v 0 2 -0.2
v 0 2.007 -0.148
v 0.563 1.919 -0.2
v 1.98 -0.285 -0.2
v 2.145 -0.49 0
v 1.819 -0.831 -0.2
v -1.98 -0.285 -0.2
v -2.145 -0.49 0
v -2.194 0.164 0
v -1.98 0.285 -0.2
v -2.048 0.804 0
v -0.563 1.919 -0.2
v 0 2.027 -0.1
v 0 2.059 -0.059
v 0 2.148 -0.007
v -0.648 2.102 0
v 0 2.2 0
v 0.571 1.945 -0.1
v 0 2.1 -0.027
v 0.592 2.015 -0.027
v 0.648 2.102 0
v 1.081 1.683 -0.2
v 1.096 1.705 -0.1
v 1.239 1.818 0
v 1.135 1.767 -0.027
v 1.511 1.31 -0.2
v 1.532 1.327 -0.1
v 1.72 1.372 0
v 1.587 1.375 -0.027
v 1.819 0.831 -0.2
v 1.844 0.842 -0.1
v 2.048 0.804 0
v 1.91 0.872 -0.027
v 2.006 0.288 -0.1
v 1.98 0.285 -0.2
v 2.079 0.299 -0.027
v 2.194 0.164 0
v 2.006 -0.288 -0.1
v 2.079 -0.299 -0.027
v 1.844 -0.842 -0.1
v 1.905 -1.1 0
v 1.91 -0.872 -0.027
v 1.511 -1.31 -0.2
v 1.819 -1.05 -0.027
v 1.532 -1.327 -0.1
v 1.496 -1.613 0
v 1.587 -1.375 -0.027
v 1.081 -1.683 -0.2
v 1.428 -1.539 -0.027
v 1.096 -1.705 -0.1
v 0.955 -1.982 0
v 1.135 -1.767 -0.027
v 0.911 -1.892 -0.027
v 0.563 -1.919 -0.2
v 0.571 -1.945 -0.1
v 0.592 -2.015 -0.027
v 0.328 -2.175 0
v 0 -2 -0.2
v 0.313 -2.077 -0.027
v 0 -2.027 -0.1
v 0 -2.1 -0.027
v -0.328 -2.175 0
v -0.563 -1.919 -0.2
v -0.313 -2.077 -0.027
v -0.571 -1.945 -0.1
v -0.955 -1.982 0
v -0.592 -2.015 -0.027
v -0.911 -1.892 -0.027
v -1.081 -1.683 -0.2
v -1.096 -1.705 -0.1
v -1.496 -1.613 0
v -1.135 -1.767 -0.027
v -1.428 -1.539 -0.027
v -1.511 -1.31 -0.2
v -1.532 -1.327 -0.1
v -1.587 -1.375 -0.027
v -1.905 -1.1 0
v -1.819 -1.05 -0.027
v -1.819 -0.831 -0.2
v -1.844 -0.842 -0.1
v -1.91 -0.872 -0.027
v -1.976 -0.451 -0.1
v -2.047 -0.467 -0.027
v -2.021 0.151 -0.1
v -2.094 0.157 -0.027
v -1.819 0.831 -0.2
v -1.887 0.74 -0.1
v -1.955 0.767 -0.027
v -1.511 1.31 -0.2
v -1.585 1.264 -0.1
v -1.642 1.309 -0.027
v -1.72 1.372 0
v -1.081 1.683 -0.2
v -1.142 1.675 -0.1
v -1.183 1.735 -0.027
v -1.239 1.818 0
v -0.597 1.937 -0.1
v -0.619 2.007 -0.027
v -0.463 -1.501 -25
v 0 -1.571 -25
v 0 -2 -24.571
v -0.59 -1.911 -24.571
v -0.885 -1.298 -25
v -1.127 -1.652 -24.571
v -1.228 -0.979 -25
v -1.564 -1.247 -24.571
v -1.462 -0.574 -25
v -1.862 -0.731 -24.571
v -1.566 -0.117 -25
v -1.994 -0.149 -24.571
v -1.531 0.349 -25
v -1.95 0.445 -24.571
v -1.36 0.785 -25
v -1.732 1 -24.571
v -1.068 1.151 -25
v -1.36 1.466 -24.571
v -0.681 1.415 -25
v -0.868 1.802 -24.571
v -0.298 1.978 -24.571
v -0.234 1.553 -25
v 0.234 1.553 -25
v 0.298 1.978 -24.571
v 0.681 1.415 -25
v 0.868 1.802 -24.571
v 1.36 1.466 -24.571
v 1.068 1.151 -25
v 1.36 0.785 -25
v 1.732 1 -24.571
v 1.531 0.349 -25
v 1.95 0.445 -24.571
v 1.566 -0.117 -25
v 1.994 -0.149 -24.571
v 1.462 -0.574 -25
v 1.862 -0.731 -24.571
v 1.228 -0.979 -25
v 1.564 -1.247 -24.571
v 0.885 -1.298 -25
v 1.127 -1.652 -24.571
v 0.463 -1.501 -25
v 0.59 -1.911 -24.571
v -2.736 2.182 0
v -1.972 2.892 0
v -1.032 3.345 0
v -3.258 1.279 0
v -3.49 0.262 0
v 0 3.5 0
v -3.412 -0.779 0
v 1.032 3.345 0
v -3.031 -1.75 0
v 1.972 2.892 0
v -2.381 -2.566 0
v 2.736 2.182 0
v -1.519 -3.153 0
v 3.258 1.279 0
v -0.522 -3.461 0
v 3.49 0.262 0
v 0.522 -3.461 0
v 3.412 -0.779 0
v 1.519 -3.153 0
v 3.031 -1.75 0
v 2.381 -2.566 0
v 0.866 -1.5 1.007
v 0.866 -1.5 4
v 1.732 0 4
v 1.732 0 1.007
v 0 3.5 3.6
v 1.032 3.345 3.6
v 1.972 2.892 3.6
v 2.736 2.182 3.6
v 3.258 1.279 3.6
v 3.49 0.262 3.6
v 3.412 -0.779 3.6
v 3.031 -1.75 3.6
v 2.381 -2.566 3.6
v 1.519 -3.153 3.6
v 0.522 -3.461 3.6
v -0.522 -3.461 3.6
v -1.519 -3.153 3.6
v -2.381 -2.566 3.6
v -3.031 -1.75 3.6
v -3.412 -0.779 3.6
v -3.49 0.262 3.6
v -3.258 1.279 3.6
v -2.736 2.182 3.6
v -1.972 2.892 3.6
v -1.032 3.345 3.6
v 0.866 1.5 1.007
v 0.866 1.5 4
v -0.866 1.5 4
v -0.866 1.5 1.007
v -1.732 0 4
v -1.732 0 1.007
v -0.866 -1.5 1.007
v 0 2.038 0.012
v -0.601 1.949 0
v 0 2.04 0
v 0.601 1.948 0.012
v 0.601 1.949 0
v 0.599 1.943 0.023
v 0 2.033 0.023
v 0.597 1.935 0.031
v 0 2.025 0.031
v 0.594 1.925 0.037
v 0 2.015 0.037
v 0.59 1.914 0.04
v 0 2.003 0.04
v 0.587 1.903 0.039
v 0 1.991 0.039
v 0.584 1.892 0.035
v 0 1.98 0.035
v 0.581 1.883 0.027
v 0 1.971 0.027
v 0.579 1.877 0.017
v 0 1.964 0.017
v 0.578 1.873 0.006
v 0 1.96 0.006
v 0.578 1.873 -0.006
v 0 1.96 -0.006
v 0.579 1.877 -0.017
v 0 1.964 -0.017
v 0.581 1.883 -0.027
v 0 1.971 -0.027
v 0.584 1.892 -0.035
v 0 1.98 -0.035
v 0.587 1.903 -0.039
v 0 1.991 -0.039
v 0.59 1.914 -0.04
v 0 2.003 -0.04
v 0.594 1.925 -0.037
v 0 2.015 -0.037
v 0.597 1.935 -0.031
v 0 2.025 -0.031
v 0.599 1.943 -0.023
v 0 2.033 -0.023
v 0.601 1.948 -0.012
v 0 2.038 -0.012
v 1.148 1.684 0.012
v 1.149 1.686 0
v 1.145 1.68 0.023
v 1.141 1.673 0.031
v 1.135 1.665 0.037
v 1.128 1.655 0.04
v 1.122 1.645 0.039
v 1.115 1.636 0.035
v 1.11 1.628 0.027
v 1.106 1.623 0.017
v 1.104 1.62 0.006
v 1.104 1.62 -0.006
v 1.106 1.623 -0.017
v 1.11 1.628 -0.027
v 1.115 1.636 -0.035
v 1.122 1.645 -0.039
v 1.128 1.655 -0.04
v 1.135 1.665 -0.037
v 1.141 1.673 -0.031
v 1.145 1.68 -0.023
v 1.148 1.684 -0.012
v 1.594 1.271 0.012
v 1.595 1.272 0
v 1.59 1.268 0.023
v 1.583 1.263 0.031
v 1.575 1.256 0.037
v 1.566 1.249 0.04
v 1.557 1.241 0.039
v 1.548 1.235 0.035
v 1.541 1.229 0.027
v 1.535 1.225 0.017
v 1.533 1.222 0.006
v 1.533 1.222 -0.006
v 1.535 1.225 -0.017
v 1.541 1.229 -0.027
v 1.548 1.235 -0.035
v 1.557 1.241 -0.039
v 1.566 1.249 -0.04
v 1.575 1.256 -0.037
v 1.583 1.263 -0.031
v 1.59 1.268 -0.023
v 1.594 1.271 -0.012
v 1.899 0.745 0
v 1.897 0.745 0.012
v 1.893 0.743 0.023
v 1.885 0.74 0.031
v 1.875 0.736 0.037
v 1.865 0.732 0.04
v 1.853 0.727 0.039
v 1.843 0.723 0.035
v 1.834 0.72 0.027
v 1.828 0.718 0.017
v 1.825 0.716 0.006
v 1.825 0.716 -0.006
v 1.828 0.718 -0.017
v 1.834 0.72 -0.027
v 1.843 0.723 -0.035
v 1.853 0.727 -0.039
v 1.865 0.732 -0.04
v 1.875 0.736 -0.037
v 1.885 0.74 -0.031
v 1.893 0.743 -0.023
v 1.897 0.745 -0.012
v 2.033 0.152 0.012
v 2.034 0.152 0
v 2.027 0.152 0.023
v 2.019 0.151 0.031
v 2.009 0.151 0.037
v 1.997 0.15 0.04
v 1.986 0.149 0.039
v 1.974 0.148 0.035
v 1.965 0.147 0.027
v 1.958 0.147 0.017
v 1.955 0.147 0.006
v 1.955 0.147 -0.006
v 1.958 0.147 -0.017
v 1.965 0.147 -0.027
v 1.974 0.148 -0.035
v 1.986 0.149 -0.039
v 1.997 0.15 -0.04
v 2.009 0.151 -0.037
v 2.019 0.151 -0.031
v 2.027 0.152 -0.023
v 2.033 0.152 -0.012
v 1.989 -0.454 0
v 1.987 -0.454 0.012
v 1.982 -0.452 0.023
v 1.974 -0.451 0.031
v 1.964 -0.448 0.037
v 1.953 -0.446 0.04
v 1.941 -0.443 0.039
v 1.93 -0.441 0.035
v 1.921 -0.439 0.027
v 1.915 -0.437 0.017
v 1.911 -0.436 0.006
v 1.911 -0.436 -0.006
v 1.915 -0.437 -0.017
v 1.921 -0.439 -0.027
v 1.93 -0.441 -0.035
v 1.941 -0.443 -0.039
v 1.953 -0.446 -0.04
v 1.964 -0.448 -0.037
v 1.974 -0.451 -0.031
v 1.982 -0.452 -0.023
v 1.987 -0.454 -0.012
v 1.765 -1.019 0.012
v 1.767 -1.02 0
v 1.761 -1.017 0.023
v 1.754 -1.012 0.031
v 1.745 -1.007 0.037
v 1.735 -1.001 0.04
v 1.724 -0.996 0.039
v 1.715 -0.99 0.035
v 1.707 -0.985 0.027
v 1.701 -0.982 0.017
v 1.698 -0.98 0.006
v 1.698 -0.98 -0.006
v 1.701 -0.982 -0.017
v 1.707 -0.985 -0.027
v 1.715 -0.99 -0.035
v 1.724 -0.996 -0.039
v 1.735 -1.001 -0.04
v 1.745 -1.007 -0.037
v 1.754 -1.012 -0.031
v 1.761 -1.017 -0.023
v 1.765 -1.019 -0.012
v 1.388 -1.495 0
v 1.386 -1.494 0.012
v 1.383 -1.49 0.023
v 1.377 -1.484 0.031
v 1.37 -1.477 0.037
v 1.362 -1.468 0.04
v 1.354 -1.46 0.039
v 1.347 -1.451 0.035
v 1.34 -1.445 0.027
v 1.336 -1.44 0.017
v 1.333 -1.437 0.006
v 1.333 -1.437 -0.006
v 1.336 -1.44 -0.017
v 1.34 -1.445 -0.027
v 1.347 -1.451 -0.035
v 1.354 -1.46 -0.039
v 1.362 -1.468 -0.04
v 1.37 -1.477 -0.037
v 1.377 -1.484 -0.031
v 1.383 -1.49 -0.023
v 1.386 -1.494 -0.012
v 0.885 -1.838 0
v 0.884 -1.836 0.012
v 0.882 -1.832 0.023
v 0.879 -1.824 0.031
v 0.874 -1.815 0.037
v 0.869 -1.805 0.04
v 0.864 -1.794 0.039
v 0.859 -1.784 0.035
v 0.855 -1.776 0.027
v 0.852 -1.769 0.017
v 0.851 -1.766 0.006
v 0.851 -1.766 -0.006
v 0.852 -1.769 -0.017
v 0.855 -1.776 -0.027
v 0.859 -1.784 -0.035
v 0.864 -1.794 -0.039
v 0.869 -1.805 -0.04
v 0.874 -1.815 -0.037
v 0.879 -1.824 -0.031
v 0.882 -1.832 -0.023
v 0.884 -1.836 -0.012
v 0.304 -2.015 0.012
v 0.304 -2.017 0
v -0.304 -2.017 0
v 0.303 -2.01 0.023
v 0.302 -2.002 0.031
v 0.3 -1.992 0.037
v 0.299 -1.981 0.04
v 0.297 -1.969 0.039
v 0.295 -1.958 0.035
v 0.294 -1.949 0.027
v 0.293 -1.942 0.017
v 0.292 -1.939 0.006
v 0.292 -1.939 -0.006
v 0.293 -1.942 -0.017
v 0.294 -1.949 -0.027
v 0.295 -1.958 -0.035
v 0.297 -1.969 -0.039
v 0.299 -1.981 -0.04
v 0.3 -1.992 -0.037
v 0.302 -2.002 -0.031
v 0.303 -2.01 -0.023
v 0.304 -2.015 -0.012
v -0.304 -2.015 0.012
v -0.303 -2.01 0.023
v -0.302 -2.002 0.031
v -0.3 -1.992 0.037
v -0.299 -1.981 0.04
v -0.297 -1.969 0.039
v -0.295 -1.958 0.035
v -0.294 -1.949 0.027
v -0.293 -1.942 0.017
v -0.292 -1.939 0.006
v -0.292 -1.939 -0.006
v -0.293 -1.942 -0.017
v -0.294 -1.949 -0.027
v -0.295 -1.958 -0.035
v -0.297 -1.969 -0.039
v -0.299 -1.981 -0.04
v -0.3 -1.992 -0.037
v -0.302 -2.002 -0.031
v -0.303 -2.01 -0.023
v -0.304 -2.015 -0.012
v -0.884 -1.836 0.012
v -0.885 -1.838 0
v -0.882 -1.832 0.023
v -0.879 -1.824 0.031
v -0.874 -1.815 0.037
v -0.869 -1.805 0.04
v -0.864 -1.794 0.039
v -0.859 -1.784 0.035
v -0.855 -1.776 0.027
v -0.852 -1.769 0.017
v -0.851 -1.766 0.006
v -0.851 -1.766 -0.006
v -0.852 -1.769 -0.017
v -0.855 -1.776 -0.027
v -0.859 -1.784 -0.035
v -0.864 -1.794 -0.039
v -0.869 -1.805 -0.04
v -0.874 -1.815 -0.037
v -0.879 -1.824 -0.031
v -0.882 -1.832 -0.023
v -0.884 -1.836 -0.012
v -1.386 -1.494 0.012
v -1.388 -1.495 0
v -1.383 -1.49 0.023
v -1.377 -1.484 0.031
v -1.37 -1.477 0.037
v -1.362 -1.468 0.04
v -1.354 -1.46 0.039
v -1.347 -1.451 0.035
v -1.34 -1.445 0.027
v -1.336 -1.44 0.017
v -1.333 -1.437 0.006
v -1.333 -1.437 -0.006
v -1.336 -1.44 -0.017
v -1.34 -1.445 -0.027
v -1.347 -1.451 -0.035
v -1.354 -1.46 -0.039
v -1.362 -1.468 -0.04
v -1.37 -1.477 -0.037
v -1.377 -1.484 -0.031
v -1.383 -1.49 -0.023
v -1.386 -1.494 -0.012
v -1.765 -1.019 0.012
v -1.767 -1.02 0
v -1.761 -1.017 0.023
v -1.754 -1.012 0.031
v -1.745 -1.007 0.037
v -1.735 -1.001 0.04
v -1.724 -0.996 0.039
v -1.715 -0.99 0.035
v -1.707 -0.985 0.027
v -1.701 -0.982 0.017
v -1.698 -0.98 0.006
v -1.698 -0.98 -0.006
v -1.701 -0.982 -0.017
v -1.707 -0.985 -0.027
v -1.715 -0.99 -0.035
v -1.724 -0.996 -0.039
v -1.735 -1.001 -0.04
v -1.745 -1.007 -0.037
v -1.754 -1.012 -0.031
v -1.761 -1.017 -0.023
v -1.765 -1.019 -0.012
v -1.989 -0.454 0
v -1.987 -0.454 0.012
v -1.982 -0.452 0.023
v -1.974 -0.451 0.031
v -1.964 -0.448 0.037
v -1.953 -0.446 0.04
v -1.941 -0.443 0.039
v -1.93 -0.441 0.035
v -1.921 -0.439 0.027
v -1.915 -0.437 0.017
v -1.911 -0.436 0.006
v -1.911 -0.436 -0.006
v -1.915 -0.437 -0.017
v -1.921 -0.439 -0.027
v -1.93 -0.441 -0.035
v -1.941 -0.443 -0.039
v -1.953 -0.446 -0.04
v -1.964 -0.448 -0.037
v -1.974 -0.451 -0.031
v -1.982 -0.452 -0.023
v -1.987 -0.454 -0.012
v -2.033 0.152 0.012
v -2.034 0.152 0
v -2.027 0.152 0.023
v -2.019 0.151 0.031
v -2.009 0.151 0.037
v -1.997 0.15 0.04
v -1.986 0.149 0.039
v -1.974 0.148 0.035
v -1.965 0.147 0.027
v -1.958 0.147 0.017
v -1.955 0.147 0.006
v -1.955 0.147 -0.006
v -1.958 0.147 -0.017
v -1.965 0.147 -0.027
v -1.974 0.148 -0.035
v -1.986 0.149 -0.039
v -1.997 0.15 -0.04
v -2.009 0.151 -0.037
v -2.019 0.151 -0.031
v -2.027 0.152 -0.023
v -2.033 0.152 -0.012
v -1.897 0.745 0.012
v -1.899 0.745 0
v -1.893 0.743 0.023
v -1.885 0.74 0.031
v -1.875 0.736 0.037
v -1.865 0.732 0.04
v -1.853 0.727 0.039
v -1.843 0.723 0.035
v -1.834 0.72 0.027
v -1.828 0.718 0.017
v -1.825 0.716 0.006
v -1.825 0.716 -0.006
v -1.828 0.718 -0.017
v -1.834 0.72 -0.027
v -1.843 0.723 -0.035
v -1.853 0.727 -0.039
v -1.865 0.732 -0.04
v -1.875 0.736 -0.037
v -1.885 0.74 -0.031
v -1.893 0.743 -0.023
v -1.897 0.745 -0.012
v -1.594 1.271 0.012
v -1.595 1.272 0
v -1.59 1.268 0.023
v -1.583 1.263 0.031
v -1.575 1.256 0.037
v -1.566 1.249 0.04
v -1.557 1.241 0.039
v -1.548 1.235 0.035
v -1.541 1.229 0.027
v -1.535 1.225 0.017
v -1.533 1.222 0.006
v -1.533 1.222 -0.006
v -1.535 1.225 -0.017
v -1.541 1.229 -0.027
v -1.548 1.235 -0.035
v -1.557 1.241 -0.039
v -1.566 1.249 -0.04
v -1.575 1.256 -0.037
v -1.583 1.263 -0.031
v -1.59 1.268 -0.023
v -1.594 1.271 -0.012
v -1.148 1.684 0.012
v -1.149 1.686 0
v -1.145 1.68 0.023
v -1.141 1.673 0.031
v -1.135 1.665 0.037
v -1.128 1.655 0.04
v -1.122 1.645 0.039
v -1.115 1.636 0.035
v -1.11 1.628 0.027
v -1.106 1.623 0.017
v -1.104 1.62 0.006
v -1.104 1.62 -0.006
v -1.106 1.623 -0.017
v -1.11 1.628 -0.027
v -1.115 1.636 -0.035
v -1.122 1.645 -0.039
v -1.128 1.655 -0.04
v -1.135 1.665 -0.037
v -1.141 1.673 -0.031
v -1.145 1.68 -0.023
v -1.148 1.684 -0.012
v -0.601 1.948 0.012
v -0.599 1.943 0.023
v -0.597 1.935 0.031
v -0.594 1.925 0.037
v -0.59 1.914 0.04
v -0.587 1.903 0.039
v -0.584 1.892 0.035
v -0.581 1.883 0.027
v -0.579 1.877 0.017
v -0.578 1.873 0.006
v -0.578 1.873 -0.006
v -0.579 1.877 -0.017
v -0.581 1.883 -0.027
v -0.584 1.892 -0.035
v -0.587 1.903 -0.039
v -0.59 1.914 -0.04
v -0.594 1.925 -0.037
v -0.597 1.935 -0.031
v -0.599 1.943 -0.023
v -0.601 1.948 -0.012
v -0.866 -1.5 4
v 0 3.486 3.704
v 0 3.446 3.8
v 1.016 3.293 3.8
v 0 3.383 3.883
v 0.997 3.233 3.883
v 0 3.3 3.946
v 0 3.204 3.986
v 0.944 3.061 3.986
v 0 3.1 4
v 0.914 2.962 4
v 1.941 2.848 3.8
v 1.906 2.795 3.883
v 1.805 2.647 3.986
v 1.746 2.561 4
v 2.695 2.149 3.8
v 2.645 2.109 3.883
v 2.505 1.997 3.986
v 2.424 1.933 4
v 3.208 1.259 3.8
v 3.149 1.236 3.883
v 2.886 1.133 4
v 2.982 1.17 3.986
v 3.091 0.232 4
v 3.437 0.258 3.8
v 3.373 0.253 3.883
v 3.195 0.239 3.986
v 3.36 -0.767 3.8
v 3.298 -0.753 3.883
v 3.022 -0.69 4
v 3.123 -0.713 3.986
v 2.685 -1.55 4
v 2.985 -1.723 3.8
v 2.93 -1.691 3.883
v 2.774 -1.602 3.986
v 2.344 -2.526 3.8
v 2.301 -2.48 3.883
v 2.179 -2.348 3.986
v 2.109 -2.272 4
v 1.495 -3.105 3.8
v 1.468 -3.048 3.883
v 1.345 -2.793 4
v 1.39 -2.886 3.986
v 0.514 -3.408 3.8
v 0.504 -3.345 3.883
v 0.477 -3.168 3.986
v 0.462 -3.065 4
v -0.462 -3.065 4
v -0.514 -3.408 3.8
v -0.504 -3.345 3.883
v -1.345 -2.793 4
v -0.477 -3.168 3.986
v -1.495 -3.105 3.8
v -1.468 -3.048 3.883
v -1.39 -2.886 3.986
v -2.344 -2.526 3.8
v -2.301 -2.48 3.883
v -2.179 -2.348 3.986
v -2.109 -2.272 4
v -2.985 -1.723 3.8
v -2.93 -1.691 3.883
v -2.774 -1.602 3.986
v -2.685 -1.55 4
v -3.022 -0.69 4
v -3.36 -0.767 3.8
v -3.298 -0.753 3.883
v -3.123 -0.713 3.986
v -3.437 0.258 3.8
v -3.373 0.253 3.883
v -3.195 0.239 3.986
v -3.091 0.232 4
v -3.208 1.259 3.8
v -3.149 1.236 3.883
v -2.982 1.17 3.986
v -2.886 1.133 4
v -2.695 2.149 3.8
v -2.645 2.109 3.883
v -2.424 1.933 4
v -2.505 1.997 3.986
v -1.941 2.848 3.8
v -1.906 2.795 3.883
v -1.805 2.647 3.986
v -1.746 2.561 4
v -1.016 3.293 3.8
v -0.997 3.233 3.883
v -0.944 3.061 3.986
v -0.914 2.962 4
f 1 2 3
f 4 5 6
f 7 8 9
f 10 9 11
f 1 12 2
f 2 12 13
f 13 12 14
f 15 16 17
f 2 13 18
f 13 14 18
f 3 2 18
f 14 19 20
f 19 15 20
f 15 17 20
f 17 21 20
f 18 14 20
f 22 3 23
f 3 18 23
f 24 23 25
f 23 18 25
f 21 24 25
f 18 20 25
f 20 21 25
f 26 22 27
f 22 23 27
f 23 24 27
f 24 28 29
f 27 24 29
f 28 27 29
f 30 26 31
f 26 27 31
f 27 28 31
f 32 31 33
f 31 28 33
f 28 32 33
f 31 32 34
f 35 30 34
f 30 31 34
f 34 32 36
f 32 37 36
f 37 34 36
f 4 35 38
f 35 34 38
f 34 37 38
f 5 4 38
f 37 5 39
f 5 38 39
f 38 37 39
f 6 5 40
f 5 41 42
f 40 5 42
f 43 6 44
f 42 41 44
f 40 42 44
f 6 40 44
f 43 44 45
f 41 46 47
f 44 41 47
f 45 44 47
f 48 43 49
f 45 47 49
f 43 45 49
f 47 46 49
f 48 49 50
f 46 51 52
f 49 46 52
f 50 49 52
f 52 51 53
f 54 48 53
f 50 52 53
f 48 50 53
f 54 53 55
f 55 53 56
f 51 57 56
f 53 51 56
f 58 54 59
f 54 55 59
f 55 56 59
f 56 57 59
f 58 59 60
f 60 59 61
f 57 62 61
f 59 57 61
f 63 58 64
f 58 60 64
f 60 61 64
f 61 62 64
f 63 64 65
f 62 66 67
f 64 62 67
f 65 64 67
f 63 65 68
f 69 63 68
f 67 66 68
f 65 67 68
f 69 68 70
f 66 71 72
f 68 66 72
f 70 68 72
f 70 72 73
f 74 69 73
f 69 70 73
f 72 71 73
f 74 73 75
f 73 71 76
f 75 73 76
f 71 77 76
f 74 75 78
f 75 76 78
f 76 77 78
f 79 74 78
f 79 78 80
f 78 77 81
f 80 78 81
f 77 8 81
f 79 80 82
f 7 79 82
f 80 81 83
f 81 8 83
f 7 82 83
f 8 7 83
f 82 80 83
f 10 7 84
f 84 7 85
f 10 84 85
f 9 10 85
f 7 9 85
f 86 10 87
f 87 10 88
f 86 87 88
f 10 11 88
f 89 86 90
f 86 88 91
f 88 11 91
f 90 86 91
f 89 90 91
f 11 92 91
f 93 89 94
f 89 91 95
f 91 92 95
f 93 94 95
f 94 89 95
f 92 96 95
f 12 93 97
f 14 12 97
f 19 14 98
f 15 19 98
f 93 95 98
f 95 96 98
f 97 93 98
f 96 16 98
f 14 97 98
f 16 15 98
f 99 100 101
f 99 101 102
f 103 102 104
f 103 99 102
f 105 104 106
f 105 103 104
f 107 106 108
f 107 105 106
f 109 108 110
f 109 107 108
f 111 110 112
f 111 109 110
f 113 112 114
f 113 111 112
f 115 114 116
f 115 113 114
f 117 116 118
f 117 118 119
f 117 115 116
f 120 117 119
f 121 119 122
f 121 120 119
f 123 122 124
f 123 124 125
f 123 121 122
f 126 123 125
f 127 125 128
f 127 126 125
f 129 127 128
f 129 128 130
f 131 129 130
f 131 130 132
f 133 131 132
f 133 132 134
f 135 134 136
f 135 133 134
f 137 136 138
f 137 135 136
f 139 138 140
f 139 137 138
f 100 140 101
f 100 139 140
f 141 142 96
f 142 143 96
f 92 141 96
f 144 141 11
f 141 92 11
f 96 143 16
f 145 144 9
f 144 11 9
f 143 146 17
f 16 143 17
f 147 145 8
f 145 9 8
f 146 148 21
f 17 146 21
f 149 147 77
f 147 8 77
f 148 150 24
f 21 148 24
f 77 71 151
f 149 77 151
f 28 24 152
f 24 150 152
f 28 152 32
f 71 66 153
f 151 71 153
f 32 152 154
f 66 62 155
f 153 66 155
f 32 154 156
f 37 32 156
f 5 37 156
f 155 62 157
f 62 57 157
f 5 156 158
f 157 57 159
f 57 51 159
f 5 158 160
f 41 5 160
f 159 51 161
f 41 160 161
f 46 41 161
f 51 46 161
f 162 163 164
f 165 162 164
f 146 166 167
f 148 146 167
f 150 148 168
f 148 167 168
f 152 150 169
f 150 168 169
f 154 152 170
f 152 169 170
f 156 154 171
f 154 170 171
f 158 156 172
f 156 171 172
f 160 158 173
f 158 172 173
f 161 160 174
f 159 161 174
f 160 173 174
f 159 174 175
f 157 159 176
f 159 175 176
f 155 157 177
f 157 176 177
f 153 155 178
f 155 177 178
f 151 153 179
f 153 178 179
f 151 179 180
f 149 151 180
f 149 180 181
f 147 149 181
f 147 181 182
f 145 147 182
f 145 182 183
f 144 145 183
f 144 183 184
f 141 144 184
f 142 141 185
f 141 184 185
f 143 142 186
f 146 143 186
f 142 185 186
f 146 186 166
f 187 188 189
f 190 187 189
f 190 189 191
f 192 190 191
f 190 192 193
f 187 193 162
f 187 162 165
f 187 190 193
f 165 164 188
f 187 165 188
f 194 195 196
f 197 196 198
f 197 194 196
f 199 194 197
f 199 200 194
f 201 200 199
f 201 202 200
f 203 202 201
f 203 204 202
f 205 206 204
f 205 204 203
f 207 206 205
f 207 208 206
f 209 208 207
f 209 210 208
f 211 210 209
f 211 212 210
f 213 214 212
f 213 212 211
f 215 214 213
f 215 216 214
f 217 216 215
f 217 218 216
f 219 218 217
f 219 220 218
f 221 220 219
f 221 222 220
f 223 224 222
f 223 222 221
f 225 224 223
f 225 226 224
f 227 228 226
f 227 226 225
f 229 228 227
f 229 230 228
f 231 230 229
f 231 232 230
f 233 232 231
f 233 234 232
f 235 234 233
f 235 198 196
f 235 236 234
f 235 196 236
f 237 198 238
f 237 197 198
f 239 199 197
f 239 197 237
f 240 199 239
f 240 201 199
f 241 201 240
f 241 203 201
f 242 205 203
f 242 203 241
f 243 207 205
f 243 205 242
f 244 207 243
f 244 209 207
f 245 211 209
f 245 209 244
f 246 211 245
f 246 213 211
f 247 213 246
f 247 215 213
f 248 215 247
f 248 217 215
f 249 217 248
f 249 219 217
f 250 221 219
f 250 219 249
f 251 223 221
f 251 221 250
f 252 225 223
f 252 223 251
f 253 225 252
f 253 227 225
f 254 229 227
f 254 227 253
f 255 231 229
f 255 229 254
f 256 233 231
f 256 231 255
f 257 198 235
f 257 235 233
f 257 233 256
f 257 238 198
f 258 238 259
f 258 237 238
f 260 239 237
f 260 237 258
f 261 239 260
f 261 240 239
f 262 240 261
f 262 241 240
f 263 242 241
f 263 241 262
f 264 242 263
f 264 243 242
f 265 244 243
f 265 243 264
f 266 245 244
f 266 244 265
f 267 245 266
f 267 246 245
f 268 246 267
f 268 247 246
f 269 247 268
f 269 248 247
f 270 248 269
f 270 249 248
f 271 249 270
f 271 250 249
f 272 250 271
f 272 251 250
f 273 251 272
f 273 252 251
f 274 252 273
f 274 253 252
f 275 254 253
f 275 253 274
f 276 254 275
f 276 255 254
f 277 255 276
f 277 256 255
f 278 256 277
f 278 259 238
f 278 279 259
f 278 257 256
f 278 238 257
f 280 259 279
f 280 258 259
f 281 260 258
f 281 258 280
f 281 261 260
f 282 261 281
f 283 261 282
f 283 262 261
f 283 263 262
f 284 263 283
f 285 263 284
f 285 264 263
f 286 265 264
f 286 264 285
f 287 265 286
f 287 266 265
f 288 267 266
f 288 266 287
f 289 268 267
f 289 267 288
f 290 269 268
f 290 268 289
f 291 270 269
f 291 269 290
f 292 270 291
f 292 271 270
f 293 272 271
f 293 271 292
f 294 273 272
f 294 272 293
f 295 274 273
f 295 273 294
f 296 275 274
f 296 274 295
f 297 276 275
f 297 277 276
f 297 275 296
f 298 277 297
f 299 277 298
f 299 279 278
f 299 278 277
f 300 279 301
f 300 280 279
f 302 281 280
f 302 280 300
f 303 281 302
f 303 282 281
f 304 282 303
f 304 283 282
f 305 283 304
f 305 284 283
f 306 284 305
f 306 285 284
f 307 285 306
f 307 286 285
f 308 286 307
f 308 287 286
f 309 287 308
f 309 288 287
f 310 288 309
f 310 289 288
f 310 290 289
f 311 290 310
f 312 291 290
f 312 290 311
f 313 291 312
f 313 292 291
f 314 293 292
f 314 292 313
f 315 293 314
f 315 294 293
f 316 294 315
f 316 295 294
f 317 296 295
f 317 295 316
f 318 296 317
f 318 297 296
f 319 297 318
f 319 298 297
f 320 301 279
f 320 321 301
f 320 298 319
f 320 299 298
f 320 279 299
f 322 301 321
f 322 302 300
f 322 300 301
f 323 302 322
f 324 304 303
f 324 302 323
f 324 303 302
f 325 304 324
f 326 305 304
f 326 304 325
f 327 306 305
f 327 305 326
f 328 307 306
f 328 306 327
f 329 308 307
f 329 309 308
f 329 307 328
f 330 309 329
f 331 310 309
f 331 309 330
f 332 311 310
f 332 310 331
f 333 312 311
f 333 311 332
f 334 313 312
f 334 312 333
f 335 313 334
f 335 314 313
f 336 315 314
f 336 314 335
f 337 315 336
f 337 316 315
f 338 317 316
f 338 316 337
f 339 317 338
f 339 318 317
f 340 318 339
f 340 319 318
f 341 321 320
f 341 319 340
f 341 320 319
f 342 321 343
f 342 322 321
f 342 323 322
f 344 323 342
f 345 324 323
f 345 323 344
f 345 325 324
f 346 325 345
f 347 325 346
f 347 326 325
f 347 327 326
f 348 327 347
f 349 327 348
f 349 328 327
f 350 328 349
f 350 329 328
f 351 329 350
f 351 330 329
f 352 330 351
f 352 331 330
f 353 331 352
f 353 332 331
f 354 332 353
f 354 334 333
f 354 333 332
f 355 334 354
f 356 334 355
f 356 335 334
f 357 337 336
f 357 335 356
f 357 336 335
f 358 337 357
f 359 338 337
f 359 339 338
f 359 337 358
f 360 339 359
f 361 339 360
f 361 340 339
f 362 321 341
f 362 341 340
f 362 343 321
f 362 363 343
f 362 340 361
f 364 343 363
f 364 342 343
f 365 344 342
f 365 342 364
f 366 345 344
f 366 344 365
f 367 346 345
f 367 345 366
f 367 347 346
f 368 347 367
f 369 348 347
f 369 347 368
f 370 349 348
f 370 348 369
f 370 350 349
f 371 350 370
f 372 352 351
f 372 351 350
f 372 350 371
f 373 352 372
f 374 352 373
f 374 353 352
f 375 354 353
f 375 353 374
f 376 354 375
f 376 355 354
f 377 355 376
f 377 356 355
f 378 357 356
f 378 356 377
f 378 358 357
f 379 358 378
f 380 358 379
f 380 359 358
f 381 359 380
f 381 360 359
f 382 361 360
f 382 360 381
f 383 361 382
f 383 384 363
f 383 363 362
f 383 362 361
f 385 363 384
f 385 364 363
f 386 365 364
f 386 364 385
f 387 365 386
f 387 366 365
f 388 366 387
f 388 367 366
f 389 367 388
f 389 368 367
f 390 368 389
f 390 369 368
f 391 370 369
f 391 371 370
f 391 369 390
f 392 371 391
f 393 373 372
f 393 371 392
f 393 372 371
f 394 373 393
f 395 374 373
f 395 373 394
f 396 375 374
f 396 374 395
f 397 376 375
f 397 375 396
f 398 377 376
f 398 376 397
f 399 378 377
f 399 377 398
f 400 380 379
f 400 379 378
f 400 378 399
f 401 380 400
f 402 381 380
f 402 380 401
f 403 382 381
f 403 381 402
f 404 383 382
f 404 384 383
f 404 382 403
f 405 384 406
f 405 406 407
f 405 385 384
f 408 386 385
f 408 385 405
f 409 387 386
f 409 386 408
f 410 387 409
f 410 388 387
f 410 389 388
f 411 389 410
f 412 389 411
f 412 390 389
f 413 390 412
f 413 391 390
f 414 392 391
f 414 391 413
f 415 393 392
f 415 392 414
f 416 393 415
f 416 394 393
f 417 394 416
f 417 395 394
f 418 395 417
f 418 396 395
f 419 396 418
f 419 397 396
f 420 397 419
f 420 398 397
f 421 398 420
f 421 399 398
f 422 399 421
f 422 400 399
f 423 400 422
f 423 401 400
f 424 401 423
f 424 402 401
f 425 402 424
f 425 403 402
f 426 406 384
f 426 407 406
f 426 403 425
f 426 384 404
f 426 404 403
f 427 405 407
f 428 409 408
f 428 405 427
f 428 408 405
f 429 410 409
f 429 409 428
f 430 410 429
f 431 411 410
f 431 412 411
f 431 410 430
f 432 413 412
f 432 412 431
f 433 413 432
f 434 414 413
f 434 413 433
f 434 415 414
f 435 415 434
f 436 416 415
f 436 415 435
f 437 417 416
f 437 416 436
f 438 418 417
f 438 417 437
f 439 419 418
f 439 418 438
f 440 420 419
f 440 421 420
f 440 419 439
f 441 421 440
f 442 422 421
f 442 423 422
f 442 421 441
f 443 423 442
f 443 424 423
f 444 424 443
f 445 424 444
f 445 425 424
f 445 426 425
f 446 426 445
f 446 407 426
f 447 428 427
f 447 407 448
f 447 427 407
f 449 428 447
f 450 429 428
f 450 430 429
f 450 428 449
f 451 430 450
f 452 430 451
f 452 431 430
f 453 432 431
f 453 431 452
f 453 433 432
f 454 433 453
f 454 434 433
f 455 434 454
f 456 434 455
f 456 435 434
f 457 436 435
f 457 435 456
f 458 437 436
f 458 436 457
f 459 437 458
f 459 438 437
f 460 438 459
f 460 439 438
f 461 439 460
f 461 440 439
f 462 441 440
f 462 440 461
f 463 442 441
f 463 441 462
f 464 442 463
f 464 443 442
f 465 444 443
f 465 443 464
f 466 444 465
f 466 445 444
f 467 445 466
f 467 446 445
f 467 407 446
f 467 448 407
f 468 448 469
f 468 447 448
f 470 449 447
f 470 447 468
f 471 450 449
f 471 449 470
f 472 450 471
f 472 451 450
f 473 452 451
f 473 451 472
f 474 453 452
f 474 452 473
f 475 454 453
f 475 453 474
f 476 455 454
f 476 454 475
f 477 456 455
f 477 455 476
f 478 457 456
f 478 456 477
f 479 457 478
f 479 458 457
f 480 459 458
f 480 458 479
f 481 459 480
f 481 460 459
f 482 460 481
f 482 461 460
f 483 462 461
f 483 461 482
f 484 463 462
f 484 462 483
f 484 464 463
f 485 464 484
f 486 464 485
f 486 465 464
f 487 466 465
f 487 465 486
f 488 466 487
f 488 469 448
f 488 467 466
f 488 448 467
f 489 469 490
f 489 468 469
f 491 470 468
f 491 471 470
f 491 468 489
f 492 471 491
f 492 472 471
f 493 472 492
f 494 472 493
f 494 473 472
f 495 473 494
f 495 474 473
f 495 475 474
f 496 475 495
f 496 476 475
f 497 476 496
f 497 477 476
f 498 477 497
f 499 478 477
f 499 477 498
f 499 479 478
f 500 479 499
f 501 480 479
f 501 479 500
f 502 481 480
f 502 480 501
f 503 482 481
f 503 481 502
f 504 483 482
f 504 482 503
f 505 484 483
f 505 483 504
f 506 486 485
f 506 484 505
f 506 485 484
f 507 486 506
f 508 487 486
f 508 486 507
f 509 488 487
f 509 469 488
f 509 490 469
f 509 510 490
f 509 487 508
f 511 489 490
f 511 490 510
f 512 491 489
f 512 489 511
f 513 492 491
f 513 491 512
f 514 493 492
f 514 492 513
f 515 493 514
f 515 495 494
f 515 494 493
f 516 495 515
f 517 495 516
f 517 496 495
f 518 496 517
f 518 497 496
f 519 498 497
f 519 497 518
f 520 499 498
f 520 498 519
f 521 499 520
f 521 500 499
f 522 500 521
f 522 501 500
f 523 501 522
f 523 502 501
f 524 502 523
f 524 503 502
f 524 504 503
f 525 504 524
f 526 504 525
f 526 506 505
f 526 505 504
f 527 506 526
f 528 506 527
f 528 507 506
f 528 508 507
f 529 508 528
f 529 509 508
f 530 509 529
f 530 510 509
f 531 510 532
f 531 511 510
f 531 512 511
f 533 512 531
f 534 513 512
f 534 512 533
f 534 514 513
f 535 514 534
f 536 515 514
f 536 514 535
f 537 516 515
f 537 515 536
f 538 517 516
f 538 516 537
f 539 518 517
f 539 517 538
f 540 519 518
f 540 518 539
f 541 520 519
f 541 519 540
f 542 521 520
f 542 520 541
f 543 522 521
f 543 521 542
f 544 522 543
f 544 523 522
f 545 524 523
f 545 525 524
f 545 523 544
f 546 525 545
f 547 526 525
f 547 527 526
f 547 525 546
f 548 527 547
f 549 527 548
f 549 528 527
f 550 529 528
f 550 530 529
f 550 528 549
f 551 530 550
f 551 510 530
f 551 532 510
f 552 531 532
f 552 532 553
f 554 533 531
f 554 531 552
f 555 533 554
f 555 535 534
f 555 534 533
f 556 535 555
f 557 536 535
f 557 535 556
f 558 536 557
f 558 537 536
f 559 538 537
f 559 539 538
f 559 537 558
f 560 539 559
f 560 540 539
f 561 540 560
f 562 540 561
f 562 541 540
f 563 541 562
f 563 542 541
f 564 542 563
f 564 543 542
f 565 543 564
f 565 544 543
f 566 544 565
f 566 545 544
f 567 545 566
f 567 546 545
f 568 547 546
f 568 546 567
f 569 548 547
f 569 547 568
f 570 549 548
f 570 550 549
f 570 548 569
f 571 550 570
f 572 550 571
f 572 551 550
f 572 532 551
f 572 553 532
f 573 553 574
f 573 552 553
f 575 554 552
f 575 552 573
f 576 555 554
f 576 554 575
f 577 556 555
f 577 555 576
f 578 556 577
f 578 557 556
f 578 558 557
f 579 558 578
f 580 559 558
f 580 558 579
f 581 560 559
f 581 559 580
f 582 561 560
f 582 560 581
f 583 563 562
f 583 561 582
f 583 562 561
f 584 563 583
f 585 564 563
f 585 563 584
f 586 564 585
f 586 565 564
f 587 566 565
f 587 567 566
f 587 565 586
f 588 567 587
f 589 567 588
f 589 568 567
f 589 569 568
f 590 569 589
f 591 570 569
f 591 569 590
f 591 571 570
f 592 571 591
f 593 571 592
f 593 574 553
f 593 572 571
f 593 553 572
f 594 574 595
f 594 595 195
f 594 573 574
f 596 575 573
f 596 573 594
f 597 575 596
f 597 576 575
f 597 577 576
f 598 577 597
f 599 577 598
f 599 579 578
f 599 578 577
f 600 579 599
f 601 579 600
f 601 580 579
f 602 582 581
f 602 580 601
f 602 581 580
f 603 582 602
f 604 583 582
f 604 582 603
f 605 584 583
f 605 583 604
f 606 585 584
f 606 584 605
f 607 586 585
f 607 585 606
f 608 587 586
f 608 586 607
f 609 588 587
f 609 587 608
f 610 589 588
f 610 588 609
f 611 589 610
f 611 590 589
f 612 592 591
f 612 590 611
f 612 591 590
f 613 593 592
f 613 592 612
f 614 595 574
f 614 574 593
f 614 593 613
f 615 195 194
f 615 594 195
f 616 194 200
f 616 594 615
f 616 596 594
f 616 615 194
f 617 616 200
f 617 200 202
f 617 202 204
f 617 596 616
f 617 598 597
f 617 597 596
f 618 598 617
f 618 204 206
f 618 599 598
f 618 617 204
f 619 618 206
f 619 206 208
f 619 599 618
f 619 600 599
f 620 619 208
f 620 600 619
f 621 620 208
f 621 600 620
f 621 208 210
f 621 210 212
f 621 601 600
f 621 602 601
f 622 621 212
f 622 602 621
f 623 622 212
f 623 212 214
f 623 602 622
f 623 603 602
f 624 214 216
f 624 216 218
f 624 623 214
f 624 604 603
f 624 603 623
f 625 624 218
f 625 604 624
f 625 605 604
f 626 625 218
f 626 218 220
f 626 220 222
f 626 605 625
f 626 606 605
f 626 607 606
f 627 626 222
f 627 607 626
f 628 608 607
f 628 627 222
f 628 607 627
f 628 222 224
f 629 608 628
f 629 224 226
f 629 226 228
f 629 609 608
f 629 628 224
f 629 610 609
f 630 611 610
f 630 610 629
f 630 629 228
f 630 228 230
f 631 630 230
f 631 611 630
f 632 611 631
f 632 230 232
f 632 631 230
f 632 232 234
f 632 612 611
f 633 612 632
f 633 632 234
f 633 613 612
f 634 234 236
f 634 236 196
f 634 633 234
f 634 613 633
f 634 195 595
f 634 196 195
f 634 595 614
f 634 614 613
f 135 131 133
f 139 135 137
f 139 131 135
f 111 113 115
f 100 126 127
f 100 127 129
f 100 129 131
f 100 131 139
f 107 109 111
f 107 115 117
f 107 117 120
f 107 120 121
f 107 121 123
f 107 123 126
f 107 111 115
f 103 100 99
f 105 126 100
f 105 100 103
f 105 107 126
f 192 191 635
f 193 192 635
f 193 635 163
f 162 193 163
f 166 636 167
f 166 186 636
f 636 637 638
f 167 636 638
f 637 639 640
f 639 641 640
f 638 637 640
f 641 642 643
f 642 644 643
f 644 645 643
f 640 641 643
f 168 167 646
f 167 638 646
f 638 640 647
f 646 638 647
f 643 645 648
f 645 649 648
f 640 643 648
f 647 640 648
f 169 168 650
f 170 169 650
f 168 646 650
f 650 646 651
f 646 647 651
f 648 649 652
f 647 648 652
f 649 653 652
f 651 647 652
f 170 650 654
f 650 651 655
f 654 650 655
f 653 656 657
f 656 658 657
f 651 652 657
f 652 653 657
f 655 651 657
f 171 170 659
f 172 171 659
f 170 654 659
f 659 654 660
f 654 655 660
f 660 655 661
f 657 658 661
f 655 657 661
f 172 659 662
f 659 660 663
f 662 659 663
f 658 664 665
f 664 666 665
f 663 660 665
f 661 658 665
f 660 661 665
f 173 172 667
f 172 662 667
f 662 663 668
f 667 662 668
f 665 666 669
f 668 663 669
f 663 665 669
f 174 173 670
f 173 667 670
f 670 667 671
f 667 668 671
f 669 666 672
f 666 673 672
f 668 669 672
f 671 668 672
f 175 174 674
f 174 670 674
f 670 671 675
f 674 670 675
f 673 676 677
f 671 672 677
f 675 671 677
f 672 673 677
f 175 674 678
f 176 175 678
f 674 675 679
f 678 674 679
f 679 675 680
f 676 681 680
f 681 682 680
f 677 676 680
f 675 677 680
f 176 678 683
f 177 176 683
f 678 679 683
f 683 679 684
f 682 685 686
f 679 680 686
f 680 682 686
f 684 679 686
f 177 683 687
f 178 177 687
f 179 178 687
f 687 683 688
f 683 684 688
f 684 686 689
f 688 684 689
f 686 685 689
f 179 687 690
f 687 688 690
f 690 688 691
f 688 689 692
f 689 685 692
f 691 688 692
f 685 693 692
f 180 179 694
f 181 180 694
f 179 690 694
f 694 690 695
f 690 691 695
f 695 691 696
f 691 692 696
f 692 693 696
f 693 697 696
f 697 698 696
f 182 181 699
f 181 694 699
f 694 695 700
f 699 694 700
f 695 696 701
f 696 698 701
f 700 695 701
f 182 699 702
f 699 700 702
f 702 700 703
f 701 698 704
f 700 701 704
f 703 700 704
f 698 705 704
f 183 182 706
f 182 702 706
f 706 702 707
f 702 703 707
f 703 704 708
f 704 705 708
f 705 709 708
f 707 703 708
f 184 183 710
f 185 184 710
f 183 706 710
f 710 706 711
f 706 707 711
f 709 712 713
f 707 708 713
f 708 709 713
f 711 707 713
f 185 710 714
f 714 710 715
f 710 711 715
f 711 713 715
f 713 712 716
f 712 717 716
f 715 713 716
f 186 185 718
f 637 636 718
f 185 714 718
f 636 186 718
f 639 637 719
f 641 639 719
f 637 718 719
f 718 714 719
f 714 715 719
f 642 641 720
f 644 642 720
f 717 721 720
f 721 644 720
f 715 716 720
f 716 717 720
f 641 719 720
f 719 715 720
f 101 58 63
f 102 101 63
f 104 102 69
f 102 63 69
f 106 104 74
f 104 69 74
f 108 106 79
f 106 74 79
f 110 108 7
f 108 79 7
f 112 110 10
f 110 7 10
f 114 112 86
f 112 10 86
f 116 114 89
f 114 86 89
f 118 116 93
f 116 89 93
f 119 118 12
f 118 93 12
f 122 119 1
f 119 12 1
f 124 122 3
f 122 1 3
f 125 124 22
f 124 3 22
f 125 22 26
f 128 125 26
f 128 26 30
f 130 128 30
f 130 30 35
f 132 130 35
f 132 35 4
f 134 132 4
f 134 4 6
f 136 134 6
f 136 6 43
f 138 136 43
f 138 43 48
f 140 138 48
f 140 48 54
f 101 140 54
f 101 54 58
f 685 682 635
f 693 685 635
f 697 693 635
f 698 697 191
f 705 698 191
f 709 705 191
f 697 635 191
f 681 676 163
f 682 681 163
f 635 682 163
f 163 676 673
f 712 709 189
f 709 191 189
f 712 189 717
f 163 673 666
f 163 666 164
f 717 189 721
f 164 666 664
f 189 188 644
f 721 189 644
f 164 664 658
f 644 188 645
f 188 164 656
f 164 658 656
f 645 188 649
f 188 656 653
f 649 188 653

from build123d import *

# Parameters (mm, degrees)
ESQUISSE1_R             = 0.04
ENL_V_MAT_EXTRU_1_DEPTH = 2.993042463
ESQUISSE3_R             = 2
BOSS_EXTRU_1_DEPTH      = 24.8
CHANFREIN1_SIZE         = 0.4294
CONG_1_R                = 0.4


with BuildPart() as part:
    # Esquisse1 → Révolution1 (revolve)
    with BuildSketch(Plane.XZ, mode=Mode.PRIVATE) as r_volution1_sk:
        with BuildLine():
            Line((3.5, 4), (0, 4))
            Line((0, 4), (0, -0.2))
            Line((0, -0.2), (2, -0.2))
            ThreePointArc((2, -0.2), (2.058578644, -0.058578644), (2.2, 0))
            Line((2.2, 0), (3.5, 0))
            Line((3.5, 0), (3.5, 4))
        make_face()
        with Locations((2, 0)):
            Circle(ESQUISSE1_R, mode=Mode.SUBTRACT)
    revolve(r_volution1_sk.sketch.rotate(Axis((0, 0, 4), (0, 0, -1)), 270), axis=Axis((0, 0, 4), (0, 0, -1)))

    # Esquisse2 → Enlèv. mat.-Extru.1 (cut)
    with BuildSketch(Plane.XY.offset(4)):
        Polygon((1.732050808, 0), (0.866025404, 1.5), (-0.866025404, 1.5), (-1.732050808, 0), (-0.866025404, -1.5), (0.866025404, -1.5), align=None)
    extrude(amount=-ENL_V_MAT_EXTRU_1_DEPTH, mode=Mode.SUBTRACT)

    # Esquisse3 → Boss.-Extru.1 (add)
    with BuildSketch(Plane(origin=(0, 0, -0.2), x_dir=(-1, 0, 0), z_dir=(0, 0, -1))):
        with Locations(Location((0, 0, 0), (0, 0, 270))):
            Circle(ESQUISSE3_R)
    extrude(amount=BOSS_EXTRU_1_DEPTH)

    # Chanfrein1
    chanfrein1_edges = [part.edges().sort_by_distance(p)[0] for p in [
        (0, 2, -25),
    ]]
    chamfer(chanfrein1_edges, length=CHANFREIN1_SIZE)

    # Congé1
    cong_1_edges = [part.edges().sort_by_distance(p)[0] for p in [
        (0, -3.5, 4),
    ]]
    fillet(cong_1_edges, radius=CONG_1_R)


solid = part.part
